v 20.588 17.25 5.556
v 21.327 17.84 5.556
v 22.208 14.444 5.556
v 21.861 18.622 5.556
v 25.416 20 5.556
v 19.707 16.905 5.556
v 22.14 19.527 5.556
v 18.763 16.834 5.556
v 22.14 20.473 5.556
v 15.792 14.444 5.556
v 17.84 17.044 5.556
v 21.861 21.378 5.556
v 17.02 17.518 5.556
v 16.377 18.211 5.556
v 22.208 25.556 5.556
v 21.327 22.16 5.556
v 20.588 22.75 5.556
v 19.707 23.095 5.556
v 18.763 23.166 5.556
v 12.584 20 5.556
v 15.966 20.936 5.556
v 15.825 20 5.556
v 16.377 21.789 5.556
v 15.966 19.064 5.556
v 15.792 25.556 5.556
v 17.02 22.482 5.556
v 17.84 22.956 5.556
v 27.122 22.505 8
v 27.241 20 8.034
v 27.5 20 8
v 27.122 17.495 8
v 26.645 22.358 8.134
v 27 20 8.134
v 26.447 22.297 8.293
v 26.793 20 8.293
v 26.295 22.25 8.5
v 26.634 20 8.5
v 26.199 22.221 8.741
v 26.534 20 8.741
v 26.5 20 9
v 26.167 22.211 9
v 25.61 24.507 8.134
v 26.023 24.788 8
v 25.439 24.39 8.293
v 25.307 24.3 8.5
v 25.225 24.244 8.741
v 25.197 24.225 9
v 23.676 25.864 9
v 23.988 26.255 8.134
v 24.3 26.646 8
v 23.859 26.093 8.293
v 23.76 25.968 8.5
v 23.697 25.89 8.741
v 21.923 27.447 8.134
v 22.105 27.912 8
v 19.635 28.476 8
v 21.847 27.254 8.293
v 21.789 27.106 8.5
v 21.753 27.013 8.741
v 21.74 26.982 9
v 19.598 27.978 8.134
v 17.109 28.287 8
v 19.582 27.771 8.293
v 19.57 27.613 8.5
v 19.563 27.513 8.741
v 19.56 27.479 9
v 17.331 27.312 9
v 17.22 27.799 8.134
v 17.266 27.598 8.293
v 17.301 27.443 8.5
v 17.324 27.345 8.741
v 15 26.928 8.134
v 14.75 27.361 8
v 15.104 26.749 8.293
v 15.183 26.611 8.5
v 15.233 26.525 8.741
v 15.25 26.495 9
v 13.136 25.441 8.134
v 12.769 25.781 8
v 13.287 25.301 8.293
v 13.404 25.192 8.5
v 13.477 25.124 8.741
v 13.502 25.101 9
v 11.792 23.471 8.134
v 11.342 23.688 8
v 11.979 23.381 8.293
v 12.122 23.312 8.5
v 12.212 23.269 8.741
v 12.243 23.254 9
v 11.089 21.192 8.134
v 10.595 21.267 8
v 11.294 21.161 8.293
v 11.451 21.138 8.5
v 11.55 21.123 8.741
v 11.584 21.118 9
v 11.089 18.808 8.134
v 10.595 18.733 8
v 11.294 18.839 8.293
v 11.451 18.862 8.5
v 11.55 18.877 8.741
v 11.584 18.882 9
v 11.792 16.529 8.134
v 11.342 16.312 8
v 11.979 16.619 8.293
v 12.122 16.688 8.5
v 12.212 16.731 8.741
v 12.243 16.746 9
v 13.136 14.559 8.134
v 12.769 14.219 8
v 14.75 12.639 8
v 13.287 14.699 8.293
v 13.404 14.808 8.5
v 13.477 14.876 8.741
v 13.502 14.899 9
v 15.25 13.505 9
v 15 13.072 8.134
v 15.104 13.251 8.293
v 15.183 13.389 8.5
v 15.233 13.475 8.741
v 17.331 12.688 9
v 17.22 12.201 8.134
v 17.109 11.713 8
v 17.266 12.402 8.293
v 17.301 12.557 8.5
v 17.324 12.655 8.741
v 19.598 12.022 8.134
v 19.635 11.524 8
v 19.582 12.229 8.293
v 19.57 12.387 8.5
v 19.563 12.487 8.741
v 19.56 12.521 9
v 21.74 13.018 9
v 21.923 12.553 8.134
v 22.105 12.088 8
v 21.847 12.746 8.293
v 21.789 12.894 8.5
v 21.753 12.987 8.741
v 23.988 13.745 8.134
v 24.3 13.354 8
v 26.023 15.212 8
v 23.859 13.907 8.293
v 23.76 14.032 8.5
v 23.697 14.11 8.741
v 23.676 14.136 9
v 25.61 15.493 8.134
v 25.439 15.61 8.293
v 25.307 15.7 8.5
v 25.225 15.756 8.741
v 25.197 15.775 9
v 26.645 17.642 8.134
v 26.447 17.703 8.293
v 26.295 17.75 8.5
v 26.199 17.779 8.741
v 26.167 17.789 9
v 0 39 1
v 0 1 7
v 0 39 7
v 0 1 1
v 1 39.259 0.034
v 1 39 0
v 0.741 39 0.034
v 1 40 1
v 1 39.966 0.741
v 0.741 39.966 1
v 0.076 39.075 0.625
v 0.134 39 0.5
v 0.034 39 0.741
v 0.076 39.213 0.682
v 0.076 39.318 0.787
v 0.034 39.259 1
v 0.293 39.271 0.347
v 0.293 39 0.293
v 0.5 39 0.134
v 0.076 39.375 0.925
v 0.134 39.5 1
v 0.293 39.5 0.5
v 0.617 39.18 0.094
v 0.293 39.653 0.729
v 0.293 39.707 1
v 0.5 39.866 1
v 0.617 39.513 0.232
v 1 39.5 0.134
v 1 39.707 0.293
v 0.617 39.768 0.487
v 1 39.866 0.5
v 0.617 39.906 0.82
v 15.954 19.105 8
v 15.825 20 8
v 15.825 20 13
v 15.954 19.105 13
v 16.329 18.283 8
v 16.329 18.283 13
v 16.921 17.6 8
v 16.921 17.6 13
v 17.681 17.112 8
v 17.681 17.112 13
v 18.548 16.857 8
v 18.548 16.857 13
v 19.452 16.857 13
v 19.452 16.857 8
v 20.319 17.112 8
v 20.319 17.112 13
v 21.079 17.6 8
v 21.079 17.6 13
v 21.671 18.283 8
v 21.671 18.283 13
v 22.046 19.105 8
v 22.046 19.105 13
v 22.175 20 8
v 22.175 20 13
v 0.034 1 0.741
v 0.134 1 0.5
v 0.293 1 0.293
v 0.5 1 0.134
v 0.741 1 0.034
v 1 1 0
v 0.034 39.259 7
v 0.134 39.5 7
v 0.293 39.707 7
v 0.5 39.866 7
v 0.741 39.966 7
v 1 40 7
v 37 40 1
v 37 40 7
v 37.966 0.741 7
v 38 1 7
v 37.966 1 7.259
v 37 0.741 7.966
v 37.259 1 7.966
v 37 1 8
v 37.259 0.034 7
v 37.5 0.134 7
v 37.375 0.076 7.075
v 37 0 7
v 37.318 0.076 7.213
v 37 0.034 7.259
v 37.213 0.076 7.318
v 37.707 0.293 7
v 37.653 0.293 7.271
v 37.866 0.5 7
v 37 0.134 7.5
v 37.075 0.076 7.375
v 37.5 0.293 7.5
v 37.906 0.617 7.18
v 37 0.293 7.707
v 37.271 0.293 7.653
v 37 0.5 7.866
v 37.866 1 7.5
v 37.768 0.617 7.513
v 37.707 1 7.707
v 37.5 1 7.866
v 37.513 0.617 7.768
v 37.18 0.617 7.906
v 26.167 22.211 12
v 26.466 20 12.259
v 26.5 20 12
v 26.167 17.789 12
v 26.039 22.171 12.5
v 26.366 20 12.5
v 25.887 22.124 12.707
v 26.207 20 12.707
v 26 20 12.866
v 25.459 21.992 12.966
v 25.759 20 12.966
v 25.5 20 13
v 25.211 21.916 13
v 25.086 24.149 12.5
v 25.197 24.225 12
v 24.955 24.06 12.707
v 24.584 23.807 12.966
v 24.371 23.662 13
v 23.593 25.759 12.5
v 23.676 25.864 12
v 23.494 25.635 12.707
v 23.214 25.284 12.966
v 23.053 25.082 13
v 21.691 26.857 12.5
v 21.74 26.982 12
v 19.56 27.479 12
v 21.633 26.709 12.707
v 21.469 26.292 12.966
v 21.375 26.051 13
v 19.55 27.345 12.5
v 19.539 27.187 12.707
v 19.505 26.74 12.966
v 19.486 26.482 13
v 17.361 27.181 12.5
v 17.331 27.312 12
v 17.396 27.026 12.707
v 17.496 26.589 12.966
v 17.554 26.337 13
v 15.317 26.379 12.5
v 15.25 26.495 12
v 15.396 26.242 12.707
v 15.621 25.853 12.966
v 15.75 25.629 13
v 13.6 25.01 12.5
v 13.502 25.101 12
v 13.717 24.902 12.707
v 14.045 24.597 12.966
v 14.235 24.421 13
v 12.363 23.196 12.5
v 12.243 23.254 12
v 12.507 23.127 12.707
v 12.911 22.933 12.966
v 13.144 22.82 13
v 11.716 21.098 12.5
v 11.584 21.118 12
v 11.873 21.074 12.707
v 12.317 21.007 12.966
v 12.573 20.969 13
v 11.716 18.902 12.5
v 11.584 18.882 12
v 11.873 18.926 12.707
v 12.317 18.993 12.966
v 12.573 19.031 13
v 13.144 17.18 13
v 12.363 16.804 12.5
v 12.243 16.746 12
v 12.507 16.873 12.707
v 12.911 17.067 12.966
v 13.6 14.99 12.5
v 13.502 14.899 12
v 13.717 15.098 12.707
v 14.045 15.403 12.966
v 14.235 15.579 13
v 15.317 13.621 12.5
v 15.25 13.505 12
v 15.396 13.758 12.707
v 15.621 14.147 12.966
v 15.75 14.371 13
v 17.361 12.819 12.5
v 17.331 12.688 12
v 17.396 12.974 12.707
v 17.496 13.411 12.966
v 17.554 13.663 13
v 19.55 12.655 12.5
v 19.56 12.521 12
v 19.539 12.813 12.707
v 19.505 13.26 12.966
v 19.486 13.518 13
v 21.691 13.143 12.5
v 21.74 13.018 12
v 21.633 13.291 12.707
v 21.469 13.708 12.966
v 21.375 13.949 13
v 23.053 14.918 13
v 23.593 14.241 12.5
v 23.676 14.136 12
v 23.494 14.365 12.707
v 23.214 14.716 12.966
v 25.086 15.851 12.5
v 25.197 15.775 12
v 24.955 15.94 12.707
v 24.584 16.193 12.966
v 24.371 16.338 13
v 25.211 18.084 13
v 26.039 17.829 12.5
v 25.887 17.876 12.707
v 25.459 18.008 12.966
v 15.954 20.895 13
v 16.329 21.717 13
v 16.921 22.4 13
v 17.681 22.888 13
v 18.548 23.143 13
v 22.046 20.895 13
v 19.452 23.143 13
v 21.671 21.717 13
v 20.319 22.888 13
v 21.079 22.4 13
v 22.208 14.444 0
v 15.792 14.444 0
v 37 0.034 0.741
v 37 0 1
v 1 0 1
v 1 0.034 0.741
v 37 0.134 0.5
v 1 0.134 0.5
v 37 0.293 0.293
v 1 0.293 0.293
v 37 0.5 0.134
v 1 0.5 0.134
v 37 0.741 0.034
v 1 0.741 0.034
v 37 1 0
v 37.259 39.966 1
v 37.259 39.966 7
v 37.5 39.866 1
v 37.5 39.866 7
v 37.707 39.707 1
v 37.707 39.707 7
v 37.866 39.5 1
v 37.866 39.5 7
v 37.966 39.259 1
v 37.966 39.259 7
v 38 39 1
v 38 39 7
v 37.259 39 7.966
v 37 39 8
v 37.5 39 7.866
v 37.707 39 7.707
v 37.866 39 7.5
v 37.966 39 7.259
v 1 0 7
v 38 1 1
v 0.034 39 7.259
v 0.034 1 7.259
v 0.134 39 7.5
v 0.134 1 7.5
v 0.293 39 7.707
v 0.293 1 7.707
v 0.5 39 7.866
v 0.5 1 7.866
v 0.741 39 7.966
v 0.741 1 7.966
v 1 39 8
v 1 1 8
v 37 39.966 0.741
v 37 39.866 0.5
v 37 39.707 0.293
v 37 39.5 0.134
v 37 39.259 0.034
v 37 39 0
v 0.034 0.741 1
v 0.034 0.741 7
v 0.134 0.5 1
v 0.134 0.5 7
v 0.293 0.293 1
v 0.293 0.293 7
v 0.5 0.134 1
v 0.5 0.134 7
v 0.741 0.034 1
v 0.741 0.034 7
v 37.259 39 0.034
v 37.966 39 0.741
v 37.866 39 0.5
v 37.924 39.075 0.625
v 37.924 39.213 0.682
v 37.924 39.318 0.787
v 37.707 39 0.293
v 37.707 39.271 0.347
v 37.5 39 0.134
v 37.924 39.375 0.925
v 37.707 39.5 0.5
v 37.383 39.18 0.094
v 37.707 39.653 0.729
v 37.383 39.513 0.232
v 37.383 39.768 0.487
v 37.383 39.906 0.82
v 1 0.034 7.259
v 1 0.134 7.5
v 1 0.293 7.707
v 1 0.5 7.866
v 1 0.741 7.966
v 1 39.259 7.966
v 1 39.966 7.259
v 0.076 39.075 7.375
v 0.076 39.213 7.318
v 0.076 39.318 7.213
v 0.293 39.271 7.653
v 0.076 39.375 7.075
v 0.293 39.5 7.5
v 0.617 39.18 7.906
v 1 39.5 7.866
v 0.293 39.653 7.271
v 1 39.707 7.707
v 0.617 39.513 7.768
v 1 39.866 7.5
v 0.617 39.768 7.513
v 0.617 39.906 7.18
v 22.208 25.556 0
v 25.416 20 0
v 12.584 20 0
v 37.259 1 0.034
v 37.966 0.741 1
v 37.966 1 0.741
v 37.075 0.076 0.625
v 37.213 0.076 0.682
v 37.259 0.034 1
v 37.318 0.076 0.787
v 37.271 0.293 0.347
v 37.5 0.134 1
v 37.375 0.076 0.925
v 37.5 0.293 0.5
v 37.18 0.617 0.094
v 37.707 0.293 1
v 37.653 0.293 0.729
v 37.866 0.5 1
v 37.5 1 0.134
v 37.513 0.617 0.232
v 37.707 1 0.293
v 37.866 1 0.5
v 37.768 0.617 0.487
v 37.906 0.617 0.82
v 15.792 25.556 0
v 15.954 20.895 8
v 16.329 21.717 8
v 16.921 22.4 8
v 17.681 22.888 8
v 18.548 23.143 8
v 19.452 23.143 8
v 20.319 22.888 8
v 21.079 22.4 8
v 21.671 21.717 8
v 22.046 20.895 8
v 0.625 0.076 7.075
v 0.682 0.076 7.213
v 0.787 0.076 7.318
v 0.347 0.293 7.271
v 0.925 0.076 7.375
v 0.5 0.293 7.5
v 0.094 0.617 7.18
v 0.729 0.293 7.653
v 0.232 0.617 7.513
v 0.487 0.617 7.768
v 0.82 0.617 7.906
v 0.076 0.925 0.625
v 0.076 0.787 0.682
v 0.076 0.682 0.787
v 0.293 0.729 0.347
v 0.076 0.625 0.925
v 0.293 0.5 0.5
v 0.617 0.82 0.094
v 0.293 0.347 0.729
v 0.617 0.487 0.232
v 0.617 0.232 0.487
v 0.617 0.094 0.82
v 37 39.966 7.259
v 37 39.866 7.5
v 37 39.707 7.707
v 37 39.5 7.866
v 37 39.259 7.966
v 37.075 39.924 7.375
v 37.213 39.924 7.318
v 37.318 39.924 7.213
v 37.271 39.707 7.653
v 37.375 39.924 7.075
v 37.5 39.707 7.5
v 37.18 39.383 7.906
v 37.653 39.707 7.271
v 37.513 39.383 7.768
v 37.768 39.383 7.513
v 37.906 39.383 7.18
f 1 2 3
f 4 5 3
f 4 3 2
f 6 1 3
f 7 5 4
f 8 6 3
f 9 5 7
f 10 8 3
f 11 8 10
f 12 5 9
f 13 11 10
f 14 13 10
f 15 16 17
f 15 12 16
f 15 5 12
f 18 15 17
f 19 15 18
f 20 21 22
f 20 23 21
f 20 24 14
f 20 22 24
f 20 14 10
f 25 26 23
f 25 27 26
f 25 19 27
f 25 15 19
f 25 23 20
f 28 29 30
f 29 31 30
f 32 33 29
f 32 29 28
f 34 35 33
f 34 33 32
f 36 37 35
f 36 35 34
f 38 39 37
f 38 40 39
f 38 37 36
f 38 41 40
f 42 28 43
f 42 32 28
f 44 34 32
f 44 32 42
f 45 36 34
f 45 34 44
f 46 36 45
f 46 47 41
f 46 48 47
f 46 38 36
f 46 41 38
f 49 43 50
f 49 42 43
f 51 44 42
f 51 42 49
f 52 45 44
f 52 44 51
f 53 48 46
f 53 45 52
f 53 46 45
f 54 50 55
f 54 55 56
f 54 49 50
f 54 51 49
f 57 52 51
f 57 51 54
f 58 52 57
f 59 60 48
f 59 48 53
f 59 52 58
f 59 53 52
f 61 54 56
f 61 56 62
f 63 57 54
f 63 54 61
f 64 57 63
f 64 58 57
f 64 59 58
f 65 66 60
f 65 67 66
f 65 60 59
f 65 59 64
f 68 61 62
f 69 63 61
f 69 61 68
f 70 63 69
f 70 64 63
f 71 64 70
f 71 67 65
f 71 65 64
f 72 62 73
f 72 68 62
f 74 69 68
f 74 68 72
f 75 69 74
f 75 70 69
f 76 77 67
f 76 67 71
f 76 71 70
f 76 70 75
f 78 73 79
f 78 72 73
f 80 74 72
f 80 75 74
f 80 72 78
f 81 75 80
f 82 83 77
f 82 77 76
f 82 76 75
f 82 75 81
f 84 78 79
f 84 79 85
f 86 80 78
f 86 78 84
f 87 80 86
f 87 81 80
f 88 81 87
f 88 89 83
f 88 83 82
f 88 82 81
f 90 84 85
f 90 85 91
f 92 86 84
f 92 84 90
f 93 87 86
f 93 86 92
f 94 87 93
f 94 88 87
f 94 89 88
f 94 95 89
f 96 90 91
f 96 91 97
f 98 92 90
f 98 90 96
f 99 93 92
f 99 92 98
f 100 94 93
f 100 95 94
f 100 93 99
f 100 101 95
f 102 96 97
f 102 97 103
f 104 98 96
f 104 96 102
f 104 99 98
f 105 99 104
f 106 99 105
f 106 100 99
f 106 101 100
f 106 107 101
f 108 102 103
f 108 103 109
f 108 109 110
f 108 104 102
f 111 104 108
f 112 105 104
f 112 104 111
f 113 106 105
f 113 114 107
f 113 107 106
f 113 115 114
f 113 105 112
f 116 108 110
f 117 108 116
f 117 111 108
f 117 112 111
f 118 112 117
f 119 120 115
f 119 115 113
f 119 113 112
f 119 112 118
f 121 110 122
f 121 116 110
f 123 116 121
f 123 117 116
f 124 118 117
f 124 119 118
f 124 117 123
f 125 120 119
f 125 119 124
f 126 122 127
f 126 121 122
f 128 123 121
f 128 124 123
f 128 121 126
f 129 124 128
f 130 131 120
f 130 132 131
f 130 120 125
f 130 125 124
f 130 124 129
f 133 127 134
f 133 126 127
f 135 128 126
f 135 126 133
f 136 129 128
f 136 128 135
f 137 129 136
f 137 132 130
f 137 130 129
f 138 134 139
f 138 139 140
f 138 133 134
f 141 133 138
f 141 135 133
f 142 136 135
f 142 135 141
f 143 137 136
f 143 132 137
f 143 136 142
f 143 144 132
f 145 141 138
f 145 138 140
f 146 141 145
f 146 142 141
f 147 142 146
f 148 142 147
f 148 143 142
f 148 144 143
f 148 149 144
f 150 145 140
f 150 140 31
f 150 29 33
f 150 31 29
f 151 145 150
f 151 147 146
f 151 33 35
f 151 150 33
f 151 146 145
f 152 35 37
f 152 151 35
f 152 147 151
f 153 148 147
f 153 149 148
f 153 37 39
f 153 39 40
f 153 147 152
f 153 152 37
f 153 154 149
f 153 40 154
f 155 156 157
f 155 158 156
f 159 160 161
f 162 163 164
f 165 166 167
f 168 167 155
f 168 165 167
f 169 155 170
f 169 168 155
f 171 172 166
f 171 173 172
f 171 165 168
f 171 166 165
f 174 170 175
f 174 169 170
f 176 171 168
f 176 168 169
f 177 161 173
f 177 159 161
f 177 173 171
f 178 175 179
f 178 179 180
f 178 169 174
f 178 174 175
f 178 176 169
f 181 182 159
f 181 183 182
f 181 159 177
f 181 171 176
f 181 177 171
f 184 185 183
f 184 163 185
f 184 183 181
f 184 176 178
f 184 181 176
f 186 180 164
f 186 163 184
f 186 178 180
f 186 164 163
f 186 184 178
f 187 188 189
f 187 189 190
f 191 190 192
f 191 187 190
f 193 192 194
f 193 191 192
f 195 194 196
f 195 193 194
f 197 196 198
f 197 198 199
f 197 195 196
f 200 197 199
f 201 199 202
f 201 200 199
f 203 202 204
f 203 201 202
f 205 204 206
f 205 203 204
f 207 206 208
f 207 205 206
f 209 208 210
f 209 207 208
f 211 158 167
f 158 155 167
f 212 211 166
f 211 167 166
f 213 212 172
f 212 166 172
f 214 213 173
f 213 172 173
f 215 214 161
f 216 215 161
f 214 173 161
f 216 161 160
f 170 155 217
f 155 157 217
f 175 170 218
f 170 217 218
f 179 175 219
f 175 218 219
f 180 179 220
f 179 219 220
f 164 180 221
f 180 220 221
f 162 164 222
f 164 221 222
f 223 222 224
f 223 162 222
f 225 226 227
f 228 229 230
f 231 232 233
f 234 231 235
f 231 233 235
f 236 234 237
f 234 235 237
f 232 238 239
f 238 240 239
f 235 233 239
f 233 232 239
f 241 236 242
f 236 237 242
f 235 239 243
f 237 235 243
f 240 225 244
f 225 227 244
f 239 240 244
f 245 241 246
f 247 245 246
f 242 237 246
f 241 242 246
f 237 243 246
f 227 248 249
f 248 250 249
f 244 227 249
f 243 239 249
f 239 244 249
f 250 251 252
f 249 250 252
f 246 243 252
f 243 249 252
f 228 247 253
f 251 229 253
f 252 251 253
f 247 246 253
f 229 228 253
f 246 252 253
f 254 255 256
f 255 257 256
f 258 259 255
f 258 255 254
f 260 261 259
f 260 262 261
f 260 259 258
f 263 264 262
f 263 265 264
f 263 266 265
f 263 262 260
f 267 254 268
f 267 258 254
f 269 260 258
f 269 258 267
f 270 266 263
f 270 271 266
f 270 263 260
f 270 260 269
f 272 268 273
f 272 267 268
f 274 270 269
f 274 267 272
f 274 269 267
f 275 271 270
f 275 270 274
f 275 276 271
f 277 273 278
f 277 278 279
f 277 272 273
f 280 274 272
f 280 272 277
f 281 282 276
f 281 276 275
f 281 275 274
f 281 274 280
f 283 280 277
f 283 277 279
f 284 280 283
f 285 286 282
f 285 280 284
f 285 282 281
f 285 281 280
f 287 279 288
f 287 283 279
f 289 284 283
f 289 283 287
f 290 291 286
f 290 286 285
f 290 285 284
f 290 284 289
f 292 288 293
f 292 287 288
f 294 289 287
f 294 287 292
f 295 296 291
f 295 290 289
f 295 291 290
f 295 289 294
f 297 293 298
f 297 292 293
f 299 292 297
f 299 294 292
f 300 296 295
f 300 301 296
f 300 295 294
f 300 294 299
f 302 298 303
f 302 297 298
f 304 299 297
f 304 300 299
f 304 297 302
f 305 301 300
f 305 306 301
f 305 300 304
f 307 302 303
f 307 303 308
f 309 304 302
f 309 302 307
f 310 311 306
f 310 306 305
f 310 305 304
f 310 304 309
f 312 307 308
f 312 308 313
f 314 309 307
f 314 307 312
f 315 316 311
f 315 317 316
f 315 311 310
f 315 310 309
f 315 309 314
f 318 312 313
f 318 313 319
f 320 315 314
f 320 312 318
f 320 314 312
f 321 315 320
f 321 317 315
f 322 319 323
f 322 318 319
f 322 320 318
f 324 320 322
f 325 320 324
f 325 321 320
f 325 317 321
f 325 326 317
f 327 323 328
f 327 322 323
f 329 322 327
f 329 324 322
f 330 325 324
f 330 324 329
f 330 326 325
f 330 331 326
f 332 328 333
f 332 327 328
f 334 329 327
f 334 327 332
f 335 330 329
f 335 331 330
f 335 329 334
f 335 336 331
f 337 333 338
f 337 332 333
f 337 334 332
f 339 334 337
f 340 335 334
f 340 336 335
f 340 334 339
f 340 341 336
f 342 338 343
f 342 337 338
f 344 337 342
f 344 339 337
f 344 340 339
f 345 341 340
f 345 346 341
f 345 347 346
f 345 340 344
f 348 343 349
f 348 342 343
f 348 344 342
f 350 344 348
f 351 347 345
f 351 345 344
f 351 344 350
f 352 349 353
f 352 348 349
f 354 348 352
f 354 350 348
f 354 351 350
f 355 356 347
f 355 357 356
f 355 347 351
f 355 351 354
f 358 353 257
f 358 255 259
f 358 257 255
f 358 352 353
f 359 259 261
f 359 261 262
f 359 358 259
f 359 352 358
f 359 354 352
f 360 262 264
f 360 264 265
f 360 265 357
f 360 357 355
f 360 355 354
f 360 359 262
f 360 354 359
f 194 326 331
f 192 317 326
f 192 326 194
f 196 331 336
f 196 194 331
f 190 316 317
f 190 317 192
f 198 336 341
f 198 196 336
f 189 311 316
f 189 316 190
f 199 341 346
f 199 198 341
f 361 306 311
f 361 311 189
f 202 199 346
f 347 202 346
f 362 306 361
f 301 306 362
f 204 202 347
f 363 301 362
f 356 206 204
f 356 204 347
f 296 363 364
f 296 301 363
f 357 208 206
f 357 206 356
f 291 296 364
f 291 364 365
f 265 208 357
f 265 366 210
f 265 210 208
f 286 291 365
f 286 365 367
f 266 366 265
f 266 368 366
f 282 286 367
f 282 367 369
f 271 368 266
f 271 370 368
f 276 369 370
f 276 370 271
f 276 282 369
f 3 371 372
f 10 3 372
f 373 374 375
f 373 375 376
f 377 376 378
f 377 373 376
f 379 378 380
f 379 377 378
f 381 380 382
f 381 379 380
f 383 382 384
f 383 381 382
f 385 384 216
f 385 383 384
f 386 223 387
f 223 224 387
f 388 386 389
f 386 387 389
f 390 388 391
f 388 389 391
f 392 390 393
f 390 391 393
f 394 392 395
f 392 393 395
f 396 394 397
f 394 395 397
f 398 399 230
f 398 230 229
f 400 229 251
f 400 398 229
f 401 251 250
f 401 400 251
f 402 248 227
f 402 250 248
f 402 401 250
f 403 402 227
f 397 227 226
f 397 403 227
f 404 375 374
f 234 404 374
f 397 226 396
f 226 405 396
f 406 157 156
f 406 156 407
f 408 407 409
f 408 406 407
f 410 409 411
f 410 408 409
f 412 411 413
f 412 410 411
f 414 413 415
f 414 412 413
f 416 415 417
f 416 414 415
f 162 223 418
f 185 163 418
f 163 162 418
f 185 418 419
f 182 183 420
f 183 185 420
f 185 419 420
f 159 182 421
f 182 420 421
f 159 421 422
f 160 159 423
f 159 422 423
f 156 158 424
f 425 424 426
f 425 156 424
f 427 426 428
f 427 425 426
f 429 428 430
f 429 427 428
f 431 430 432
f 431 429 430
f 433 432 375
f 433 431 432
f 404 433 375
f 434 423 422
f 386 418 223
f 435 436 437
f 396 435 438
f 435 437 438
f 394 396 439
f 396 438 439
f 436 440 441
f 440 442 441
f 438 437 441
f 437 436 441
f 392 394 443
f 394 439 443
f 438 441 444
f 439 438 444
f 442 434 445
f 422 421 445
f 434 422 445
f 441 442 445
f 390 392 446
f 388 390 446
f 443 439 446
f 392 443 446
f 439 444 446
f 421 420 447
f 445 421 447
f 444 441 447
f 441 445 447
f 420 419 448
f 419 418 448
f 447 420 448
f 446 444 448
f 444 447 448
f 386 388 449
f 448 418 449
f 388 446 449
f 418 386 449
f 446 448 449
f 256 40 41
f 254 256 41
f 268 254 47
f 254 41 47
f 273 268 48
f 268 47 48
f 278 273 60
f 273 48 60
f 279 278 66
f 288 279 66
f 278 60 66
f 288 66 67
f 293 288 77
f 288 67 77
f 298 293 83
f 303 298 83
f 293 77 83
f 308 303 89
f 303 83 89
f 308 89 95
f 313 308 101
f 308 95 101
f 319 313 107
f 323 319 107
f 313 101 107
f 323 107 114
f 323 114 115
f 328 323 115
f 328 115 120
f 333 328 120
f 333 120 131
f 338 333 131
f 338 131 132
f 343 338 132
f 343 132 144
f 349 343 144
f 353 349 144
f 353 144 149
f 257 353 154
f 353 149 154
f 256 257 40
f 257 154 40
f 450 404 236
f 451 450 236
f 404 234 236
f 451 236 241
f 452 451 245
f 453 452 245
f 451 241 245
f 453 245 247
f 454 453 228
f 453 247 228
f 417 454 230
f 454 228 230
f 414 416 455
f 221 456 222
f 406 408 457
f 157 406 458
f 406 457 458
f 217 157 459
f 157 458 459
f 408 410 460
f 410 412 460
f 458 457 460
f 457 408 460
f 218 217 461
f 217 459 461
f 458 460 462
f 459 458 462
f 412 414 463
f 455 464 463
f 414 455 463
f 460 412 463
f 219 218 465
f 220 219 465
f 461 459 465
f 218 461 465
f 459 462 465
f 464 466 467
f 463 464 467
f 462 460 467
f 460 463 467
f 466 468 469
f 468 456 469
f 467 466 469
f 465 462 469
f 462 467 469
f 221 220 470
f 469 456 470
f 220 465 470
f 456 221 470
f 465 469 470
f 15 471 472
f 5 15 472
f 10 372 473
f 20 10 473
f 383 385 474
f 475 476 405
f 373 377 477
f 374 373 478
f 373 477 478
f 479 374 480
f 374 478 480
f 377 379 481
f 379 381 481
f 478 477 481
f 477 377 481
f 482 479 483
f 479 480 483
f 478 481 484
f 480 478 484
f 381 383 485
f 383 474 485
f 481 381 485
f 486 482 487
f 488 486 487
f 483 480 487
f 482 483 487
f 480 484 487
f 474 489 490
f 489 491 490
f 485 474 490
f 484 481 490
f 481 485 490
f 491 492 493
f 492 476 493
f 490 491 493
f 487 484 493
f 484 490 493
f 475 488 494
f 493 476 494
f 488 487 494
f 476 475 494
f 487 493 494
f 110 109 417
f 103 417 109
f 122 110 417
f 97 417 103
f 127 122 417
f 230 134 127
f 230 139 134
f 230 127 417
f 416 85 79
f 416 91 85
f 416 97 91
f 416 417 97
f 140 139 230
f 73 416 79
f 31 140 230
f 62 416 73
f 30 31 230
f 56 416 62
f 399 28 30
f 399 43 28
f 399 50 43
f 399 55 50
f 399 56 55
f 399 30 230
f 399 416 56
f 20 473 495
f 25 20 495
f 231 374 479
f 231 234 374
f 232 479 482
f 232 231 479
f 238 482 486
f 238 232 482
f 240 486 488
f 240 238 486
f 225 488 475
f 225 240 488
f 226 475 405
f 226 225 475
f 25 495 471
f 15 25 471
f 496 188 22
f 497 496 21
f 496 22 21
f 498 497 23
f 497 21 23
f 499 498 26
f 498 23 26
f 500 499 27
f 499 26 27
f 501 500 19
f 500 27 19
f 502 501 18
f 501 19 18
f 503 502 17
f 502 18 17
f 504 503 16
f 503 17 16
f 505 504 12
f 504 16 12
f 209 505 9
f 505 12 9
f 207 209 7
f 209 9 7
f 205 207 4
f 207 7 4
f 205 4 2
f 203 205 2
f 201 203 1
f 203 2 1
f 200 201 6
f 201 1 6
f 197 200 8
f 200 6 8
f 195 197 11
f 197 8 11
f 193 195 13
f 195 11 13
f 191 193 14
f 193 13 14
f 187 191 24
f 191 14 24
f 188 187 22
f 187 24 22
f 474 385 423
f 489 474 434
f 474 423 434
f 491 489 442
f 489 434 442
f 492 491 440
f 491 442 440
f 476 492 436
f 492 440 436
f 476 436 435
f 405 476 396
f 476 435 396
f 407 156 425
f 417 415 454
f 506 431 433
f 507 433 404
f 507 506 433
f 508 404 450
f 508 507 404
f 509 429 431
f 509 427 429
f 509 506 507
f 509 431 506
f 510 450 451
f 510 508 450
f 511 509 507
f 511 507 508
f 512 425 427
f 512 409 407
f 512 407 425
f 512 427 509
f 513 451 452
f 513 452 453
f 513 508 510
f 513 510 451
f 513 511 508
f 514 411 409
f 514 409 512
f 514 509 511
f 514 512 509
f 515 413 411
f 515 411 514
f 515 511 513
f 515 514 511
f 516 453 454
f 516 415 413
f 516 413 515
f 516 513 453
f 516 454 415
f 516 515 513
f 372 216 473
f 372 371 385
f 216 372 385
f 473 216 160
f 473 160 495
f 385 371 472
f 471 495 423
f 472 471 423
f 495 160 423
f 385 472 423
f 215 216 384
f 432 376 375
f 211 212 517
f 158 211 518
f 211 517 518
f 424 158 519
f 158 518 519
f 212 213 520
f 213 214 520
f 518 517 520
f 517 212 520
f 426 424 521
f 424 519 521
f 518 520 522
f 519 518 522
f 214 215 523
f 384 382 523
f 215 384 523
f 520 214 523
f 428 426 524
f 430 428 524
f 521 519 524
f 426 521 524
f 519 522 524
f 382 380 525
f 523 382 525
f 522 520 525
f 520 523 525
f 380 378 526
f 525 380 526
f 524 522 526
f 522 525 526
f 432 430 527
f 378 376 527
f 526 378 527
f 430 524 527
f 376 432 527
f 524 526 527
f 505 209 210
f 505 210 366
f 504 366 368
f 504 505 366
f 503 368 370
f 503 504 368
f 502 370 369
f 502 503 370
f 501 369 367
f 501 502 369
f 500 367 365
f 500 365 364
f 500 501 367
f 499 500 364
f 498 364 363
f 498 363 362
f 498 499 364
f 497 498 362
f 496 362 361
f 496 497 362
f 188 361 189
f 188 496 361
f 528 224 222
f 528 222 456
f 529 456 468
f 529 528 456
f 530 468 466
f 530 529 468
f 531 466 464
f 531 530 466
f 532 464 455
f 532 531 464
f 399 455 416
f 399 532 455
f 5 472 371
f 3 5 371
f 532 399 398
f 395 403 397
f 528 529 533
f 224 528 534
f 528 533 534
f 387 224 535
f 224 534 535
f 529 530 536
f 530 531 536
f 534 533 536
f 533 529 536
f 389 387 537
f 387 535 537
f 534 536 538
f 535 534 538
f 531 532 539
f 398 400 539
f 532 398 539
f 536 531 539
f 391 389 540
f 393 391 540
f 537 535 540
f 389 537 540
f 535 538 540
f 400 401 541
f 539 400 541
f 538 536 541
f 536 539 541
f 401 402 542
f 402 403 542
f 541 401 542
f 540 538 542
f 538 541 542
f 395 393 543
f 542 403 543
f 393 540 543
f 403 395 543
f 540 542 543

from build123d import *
from build123d.topology import SkipClean

# Parameters (mm, degrees)
SKETCH1_W           = 38
SKETCH1_H           = 40
BOSS_EXTRUDE1_DEPTH = 8
SKETCH2_R           = 7.5
SKETCH2_R_2         = 3.175
BOSS_EXTRUDE2_DEPTH = 5
FILLET1_R           = 1
CUT_EXTRUDE1_DEPTH  = 5.55625
SKETCH4_R           = 3.175
CUT_EXTRUDE2_DEPTH  = 57.683330883


with BuildPart() as part:
    # Sketch1 → Boss-Extrude1 (new body)
    with BuildSketch(Plane.XY):
        with Locations((19, 20)):
            Rectangle(SKETCH1_W, SKETCH1_H)
    extrude(amount=BOSS_EXTRUDE1_DEPTH)

    # Sketch2 → Boss-Extrude2 (add)
    with BuildSketch(Plane.XY.offset(8)):
        with Locations((19, 20)):
            Circle(SKETCH2_R)
        with Locations((19, 20)):
            Circle(SKETCH2_R_2, mode=Mode.SUBTRACT)
    extrude(amount=BOSS_EXTRUDE2_DEPTH)

    # Fillet1
    fillet1_edges = [part.edges().sort_by_distance(p)[0] for p in [
        (38, 20, 8),
        (11.5, 20, 8),
        (11.5, 20, 13),
        (19, 40, 8),
        (0, 20, 8),
        (19, 40, 0),
        (38, 20, 0),
        (19, 0, 0),
        (0, 20, 0),
        (0, 40, 4),
        (38, 40, 4),
        (38, 0, 4),
        (0, 0, 4),
        (19, 0, 8),
    ]]
    fillet(fillet1_edges, radius=FILLET1_R)

    # Sketch3 → Cut-Extrude1 (cut)
    with BuildSketch(Plane(origin=(0, 0, 0), x_dir=(-1, 0, 0), z_dir=(0, 0, -1))):
        Polygon((-15.791953229, 25.5565), (-22.208046771, 25.5565), (-25.416093542, 20), (-22.208046771, 14.4435), (-15.791953229, 14.4435), (-12.583906458, 20), align=None)
    extrude(amount=-CUT_EXTRUDE1_DEPTH, mode=Mode.SUBTRACT)

    # Sketch4 → Cut-Extrude2 (cut, through all)
    with SkipClean():  # the faces are left unmerged after this step: merging them gives an invalid solid
        with BuildSketch(Plane(origin=(0, 0, 0), x_dir=(-1, 0, 0), z_dir=(0, 0, -1))):
            with Locations((-19, 20)):
                Circle(SKETCH4_R)
        extrude(amount=-CUT_EXTRUDE2_DEPTH, mode=Mode.SUBTRACT)


solid = part.part
